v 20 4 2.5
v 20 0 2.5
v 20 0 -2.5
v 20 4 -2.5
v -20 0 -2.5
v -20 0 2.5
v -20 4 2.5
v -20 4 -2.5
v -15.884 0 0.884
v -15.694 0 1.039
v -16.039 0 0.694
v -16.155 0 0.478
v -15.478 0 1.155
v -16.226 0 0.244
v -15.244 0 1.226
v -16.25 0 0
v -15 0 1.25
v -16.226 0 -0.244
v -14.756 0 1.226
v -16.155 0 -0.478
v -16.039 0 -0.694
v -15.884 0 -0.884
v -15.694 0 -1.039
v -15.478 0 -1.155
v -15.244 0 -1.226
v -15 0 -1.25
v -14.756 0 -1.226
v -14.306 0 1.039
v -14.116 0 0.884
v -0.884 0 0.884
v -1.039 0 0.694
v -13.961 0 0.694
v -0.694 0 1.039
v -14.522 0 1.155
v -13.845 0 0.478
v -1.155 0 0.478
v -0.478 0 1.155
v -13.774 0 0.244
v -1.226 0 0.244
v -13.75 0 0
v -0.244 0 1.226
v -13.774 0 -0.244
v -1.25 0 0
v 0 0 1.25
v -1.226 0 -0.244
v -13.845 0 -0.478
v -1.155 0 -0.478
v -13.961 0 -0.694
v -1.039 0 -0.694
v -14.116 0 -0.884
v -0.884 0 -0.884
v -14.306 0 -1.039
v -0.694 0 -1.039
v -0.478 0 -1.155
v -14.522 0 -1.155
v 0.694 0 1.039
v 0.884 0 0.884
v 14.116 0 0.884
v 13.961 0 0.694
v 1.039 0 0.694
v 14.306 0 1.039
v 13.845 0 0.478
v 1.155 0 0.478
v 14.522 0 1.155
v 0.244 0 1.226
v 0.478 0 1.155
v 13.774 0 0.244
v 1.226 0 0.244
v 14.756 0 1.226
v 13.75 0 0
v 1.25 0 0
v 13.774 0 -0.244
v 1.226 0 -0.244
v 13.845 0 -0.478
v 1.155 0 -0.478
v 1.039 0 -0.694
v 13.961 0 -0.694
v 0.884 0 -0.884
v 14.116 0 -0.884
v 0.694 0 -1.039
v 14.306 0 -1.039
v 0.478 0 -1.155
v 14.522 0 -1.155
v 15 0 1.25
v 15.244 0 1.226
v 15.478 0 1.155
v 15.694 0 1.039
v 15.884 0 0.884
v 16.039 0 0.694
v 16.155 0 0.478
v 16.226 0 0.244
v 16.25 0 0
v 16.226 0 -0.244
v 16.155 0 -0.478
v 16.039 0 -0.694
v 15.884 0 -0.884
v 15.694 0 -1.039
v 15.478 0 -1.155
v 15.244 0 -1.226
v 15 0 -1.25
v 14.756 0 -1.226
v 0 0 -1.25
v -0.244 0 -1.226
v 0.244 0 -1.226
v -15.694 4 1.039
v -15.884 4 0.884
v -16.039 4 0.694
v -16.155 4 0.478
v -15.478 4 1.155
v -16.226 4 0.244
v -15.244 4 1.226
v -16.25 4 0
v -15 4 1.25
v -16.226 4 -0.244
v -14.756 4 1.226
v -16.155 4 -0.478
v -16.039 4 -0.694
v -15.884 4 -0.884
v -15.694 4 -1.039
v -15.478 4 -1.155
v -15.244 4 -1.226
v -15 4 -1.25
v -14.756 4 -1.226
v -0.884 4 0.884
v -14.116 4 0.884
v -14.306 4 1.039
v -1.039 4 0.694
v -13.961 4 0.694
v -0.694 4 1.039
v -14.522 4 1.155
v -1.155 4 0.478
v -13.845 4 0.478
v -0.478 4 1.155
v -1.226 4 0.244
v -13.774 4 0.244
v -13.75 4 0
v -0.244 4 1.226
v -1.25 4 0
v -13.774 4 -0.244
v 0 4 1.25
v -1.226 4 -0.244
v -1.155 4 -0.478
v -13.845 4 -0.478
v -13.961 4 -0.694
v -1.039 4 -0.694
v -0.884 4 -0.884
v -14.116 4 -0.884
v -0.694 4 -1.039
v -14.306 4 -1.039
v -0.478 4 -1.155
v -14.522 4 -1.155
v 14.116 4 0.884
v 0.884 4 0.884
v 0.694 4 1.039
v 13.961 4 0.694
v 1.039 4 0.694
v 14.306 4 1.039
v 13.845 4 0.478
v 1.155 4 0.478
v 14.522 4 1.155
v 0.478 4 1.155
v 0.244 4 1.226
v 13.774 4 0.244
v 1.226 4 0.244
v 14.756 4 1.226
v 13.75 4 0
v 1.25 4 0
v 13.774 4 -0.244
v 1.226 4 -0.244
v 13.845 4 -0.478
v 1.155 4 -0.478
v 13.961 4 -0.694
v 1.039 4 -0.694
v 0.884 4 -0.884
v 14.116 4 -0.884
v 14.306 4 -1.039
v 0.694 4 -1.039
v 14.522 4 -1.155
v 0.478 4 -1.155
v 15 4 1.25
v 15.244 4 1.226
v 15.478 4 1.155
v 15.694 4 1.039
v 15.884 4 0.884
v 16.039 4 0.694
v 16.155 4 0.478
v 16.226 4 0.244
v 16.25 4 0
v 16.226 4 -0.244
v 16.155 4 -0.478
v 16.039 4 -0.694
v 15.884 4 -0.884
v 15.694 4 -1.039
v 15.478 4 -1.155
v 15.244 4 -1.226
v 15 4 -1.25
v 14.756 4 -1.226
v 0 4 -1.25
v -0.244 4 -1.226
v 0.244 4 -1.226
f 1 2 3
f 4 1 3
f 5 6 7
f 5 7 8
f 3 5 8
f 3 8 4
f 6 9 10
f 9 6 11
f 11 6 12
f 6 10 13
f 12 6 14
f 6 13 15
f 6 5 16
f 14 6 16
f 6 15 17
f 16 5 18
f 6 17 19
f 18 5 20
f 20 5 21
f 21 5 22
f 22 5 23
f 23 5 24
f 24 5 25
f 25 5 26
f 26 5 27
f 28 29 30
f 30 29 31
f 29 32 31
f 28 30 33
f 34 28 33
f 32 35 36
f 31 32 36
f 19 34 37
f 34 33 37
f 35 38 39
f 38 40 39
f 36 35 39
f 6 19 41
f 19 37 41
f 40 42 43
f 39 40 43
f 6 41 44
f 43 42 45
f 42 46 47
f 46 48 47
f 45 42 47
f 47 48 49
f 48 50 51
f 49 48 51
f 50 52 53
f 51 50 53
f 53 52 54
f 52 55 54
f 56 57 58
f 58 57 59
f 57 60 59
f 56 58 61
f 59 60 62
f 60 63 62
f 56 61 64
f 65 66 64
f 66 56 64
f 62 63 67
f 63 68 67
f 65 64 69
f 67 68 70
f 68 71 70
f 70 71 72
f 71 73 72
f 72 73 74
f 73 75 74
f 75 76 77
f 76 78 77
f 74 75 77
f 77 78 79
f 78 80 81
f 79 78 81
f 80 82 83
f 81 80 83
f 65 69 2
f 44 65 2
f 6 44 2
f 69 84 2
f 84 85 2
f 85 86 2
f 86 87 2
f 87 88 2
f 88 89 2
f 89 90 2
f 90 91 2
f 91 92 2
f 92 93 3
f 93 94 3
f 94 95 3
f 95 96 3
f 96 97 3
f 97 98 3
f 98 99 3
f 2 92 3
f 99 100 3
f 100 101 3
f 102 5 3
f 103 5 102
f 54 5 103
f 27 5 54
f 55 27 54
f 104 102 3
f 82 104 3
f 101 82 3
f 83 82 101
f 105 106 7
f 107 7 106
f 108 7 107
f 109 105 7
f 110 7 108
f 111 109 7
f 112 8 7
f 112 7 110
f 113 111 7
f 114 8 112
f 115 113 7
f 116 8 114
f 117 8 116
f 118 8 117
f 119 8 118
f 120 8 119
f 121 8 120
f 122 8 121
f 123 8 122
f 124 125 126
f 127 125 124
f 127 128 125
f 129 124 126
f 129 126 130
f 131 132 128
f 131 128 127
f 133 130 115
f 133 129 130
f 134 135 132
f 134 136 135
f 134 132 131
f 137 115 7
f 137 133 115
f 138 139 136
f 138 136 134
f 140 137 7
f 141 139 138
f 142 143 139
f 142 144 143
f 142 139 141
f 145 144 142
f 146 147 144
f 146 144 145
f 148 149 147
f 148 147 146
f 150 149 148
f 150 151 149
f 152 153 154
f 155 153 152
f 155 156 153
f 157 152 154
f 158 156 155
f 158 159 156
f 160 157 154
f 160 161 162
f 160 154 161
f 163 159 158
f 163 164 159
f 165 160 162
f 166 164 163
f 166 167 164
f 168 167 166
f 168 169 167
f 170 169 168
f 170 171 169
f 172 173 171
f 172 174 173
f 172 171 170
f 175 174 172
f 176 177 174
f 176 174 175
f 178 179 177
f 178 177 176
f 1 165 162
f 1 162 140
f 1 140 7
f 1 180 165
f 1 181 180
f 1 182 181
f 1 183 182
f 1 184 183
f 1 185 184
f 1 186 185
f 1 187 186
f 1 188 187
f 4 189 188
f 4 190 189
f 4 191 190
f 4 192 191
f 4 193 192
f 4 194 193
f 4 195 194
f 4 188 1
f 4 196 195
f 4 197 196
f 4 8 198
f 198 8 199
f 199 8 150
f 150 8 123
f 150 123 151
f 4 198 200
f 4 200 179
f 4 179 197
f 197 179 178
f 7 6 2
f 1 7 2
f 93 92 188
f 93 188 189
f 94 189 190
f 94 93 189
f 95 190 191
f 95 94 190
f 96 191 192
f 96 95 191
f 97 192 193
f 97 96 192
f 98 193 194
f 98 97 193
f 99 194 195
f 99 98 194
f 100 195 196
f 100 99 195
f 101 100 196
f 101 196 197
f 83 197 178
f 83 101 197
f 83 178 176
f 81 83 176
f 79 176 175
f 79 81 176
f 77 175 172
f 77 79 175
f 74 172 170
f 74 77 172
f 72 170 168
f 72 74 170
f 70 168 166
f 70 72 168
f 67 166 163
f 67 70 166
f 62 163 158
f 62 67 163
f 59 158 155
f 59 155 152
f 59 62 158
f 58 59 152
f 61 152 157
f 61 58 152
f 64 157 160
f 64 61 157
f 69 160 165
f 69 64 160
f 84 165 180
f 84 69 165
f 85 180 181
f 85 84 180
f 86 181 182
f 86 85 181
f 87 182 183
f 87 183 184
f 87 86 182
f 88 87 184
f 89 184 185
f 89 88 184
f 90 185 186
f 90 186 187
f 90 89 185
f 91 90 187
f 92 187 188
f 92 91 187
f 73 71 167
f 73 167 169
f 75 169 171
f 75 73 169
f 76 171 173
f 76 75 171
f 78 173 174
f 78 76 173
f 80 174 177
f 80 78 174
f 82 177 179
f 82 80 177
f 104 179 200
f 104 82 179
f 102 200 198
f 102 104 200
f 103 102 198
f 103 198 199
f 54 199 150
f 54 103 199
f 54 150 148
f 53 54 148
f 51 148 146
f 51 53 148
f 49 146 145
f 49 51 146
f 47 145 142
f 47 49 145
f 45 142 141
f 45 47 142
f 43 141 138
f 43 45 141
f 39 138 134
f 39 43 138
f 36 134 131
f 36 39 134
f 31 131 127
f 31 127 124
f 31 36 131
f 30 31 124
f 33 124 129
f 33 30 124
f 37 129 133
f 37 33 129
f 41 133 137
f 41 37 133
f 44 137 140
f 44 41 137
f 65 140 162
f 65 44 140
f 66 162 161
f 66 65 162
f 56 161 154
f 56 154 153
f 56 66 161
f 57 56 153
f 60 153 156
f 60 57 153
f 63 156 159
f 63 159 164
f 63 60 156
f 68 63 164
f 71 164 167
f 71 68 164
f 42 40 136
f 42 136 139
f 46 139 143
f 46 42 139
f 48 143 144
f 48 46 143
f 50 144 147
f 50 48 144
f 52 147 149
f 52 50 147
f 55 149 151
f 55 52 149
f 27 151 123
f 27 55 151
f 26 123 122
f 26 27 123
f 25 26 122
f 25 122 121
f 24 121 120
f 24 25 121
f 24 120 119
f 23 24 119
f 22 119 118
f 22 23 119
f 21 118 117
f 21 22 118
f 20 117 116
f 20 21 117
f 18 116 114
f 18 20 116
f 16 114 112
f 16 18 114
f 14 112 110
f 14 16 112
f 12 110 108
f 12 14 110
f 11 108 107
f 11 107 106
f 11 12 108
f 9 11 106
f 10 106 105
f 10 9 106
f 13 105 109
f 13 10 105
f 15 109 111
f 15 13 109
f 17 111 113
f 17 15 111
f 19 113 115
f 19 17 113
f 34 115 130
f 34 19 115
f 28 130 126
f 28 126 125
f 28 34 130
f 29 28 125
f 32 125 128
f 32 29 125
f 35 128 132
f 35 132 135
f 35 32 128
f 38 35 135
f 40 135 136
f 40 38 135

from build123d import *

# Parameters (mm, degrees)
SKETCH_1_W      = 40
SKETCH_1_H      = 5
SKETCH_1_R      = 1.25
EXTRUDE_1_DEPTH = 4


with BuildPart() as part:
    # 스케치1 → 보스-돌출1 (new body)
    with BuildSketch(Plane(origin=(0, 0, 0), x_dir=(1, 0, 0), z_dir=(0, 1, 0))):
        Rectangle(SKETCH_1_W, SKETCH_1_H)
        Circle(SKETCH_1_R, mode=Mode.SUBTRACT)
        with Locations((15, 0)):
            Circle(SKETCH_1_R, mode=Mode.SUBTRACT)
        with Locations((-15, 0)):
            Circle(SKETCH_1_R, mode=Mode.SUBTRACT)
    extrude(amount=EXTRUDE_1_DEPTH)


solid = part.part
